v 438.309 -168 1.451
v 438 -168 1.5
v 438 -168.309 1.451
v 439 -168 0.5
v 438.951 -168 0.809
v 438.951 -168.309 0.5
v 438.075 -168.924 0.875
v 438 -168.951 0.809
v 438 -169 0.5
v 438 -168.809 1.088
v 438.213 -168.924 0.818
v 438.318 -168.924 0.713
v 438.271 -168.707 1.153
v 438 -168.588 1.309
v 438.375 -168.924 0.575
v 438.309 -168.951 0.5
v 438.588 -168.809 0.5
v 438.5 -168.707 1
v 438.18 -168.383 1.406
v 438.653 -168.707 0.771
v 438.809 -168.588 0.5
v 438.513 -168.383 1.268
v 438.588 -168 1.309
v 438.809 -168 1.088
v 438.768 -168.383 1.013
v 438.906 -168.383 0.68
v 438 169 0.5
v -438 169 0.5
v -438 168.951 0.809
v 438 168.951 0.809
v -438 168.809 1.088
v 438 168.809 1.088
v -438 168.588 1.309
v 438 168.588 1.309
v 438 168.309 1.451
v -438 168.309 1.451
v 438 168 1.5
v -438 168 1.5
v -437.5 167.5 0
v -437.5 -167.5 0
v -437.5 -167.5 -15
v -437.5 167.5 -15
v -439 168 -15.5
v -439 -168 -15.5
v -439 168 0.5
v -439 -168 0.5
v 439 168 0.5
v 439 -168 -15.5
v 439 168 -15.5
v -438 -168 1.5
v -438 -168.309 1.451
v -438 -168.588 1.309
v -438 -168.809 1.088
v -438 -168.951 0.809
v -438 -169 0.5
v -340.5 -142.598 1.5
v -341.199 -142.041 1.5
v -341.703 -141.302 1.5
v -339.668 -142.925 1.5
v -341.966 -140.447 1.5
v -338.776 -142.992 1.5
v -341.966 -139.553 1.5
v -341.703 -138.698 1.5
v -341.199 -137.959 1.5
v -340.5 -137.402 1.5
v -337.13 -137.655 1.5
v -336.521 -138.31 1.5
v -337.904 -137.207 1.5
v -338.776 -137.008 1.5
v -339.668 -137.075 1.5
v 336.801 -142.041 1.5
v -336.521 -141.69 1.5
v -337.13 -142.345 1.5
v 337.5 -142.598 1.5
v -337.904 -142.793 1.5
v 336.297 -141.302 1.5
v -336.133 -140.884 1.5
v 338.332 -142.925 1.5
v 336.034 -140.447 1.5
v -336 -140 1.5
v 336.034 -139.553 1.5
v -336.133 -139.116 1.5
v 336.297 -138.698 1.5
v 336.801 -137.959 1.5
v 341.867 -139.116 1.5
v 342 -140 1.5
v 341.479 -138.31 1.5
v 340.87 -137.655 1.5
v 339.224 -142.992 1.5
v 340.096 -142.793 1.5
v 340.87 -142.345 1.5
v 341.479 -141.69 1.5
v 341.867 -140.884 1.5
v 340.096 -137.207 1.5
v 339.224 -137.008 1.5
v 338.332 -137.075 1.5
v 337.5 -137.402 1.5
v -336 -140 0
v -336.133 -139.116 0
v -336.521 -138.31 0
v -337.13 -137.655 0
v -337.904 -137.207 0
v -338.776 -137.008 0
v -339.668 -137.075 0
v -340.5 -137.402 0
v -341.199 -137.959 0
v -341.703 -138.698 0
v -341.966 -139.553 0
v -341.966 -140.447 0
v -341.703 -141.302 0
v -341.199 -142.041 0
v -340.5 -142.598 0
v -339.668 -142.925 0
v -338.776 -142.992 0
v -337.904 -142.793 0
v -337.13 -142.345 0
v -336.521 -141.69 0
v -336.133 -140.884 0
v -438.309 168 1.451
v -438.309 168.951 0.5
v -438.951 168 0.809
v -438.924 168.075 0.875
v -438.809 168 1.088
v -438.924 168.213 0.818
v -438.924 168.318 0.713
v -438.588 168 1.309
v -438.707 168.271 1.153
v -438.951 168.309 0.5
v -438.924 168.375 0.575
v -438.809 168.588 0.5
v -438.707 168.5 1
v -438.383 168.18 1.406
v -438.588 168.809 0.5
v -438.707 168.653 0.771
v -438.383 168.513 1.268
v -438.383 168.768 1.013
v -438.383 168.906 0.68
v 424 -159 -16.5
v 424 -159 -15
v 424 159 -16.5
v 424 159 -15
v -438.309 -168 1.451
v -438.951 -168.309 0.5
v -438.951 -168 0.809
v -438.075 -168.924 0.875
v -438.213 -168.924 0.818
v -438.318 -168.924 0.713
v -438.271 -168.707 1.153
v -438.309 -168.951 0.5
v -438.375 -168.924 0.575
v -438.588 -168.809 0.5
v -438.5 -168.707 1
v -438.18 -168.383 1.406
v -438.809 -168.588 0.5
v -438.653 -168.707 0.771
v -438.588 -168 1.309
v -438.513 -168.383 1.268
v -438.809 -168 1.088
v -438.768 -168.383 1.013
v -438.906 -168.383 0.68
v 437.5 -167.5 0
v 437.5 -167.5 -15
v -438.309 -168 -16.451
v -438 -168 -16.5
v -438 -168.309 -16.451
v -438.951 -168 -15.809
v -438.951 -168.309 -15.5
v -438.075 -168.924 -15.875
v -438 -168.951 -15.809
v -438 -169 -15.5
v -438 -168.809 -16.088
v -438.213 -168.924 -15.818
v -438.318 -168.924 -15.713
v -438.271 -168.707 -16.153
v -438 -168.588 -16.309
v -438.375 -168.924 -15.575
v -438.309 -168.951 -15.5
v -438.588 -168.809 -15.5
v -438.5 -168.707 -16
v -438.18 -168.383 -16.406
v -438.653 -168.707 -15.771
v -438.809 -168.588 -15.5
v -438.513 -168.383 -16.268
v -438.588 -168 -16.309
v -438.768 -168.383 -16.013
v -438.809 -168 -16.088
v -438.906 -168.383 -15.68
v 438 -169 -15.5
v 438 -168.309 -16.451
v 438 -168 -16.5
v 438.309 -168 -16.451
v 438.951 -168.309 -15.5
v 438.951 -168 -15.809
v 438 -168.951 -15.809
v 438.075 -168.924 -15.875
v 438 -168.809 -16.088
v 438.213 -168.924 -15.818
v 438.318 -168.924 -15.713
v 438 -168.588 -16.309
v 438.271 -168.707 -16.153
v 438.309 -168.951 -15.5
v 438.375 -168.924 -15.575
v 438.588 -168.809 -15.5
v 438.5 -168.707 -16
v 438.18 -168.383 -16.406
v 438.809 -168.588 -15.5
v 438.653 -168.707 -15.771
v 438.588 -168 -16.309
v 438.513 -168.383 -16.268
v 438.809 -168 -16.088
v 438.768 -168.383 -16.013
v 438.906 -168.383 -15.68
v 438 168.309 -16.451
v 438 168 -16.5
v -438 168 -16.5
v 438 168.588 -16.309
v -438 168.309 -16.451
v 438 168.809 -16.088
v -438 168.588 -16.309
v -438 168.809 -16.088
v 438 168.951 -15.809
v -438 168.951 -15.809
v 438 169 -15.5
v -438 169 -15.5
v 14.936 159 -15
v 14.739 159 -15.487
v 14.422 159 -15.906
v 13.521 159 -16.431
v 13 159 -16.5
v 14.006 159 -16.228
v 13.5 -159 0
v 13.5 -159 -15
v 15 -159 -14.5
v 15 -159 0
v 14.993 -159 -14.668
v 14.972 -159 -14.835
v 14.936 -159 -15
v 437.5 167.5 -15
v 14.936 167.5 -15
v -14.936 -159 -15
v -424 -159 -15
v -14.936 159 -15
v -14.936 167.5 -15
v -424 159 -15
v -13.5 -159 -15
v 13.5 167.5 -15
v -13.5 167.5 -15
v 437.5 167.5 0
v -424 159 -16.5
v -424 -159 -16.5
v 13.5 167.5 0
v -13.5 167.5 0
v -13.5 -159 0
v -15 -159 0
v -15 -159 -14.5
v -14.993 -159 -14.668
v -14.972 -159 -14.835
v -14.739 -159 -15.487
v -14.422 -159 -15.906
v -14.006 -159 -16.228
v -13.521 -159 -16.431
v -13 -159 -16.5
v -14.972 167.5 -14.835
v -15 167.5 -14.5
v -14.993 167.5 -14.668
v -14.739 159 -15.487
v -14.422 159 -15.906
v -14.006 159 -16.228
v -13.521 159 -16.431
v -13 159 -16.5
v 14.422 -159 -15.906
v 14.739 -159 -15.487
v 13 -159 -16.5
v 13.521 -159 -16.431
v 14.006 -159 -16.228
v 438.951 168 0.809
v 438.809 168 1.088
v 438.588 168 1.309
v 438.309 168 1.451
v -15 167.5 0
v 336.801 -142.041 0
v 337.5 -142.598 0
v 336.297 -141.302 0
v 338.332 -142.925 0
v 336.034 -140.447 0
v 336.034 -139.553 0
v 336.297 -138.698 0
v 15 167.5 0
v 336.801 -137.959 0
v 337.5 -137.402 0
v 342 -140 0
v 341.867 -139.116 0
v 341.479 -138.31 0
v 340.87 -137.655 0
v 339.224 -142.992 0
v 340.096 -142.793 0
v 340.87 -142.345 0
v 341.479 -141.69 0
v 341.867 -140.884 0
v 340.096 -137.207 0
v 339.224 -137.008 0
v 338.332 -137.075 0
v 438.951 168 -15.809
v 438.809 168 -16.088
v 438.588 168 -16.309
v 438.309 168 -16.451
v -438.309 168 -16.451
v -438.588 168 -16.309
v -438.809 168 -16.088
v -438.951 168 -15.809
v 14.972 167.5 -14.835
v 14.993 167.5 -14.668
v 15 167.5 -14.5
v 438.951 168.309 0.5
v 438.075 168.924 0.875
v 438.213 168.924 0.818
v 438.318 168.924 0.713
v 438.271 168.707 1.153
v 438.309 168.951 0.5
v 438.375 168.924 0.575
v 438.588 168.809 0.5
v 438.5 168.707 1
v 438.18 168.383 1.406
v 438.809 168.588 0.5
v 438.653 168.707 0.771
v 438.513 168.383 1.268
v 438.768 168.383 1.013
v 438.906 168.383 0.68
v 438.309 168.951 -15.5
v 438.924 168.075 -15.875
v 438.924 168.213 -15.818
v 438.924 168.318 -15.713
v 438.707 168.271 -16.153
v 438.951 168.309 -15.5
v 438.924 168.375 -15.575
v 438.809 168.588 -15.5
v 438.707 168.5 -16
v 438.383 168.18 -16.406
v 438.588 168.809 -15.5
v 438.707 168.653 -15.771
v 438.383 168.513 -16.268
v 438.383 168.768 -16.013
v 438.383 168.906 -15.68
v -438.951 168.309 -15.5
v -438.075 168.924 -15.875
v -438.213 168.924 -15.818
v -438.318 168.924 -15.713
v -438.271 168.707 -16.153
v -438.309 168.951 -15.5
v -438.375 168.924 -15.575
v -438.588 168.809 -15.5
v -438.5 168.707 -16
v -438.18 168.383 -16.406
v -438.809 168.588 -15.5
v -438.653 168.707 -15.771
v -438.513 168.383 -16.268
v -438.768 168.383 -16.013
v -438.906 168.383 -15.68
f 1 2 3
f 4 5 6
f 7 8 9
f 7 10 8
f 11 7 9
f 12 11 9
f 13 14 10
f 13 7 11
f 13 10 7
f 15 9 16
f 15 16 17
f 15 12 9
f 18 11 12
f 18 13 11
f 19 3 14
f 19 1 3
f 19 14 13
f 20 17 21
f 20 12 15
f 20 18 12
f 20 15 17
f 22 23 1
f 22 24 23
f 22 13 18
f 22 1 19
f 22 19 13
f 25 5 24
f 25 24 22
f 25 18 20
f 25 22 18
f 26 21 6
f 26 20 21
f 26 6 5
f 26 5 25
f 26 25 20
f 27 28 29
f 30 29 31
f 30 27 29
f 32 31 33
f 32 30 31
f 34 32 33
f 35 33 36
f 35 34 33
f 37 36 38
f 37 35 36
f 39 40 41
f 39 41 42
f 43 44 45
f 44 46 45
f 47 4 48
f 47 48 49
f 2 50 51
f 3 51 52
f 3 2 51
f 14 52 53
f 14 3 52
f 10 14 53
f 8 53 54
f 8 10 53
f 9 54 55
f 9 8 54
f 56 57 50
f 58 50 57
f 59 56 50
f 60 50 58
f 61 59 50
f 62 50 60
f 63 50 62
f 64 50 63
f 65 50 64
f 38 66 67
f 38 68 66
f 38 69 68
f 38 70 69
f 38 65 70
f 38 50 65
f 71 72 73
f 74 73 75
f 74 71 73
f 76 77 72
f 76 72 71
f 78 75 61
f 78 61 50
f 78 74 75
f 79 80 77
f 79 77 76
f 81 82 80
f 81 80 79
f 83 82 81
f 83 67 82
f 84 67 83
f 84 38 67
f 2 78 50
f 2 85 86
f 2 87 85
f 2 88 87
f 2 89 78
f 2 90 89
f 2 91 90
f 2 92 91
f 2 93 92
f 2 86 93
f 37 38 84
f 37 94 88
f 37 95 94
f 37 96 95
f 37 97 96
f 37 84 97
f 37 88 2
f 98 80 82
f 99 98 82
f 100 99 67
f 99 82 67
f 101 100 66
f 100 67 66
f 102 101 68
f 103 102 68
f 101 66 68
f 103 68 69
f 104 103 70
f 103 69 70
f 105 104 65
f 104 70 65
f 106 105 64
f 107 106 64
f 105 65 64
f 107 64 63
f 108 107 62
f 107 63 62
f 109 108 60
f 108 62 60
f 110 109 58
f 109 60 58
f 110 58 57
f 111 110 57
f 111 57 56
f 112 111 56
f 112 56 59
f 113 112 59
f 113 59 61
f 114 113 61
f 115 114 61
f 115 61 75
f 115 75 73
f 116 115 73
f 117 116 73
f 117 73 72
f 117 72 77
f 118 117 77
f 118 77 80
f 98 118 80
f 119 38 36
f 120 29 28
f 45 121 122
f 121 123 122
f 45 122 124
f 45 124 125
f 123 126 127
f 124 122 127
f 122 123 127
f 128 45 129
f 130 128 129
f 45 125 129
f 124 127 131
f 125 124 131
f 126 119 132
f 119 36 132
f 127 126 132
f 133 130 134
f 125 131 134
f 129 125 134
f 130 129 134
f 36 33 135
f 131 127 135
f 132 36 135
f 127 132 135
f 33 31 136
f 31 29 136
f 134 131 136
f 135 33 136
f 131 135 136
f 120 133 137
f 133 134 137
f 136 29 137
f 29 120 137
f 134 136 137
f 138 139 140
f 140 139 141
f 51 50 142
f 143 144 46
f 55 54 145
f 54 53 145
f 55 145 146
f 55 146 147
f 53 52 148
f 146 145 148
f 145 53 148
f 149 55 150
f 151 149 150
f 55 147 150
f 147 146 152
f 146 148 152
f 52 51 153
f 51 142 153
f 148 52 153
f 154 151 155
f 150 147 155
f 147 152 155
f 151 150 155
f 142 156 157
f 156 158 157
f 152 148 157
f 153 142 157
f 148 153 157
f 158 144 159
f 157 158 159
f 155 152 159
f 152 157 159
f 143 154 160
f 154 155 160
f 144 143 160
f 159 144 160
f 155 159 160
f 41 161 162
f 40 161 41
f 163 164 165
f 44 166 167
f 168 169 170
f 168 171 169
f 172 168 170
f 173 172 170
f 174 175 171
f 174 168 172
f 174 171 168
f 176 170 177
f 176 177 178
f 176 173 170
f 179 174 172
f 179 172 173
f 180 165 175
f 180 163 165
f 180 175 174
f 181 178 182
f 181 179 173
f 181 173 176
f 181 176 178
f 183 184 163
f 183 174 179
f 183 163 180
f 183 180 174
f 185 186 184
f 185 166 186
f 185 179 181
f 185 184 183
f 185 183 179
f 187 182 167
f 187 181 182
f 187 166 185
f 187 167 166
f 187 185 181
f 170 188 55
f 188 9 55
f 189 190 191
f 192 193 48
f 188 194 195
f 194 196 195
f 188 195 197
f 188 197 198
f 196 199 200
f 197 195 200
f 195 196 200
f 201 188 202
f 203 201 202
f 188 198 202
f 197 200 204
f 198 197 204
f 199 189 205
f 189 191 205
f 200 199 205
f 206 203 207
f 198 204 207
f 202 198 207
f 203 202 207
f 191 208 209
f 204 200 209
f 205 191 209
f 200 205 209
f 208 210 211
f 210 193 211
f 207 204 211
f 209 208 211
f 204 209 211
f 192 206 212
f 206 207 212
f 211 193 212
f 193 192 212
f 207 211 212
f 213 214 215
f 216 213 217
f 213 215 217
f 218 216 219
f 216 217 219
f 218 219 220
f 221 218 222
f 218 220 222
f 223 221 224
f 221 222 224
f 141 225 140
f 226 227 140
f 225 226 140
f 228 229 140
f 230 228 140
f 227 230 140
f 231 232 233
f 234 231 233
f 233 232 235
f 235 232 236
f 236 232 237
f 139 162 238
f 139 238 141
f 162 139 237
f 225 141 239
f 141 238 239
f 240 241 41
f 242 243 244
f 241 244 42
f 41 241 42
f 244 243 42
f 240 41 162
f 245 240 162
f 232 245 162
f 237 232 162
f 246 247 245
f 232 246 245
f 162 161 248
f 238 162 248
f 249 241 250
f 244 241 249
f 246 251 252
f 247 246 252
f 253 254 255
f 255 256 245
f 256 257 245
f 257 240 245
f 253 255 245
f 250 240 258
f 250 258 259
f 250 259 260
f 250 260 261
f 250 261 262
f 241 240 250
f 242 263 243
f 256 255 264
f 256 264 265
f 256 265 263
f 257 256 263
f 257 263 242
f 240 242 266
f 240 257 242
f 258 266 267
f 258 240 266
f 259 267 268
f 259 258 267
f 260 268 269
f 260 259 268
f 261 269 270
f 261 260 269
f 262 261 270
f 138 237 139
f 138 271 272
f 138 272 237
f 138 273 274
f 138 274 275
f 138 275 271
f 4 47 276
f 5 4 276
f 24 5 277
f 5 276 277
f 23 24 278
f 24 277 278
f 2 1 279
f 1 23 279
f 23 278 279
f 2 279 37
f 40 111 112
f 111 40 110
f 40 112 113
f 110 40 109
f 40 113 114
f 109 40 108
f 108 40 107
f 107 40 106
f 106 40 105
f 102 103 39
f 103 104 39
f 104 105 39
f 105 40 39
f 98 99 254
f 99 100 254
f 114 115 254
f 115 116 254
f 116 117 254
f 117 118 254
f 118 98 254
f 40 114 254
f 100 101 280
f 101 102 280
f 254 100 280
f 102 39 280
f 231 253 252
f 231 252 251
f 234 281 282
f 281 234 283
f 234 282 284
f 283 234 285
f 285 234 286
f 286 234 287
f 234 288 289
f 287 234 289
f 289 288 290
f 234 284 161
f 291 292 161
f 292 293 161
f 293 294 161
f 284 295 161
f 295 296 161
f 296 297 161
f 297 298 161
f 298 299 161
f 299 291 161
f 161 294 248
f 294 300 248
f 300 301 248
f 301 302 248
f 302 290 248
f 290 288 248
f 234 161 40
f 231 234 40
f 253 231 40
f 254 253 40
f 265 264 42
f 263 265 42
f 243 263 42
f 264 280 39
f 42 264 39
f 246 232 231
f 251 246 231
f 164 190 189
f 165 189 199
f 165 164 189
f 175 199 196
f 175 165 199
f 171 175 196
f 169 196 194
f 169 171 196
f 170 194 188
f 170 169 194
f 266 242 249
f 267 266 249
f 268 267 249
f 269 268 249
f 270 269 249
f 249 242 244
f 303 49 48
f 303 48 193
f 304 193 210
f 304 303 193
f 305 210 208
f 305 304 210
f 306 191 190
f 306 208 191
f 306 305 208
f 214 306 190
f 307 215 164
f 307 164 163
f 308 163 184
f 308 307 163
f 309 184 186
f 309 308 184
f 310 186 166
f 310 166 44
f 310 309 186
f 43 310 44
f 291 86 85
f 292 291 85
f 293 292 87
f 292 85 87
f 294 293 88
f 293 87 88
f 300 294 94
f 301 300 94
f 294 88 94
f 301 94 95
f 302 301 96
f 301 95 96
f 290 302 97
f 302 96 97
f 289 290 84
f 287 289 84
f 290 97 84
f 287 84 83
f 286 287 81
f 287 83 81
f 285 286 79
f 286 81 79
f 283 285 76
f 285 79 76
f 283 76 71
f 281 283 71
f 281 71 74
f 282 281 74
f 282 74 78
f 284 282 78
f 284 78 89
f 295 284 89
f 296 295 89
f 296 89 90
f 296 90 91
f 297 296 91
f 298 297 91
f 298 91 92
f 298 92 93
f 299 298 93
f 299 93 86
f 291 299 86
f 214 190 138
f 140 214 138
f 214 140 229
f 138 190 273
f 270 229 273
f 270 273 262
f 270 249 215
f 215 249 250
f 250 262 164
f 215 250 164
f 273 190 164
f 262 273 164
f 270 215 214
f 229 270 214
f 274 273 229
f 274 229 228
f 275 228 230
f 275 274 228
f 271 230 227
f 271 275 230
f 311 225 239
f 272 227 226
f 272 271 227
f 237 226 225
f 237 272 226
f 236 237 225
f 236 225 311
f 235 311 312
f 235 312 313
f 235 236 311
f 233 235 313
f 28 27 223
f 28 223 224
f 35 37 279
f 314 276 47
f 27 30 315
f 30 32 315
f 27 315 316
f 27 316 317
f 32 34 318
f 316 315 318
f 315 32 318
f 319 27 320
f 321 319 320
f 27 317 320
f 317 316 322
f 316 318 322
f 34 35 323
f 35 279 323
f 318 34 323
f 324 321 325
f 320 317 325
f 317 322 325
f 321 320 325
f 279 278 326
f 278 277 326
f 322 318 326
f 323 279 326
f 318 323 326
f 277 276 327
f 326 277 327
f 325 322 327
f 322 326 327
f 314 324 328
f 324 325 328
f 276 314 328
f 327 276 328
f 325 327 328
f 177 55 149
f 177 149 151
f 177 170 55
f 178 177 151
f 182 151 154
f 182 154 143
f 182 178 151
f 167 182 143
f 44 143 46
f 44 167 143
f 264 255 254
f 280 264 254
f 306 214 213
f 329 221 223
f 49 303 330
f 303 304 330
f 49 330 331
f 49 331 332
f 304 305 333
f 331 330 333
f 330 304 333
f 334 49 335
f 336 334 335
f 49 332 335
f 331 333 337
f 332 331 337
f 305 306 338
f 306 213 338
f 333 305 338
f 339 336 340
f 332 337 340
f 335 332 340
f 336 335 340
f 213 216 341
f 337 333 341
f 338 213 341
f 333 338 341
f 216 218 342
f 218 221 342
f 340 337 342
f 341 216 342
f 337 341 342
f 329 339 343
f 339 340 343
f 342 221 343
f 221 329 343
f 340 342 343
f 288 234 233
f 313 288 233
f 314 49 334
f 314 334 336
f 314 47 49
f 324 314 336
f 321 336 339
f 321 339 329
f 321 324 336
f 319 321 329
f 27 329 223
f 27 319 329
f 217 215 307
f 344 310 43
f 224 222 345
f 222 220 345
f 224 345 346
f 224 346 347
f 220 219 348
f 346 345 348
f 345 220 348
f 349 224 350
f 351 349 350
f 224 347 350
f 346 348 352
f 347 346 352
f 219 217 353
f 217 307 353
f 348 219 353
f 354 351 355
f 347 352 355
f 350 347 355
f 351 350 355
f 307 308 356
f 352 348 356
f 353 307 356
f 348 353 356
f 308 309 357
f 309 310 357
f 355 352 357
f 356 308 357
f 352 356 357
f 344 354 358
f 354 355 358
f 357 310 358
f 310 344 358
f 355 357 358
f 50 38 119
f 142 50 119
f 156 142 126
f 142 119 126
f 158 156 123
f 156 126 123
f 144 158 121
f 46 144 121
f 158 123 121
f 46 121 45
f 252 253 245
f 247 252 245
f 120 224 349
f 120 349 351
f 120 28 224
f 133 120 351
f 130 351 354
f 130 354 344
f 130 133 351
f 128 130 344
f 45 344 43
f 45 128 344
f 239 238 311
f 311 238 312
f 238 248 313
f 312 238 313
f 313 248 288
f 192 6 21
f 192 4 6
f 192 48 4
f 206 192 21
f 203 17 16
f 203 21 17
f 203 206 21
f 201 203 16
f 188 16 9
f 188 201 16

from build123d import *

# Parameters (mm, degrees)
SKETCH_1_W          = 878
SKETCH_1_H          = 338
EXTRUDE_1_DEPTH     = 1.5
SKETCH_2_W          = 878
SKETCH_2_H          = 338
SKETCH_2_W_2        = 875
SKETCH_2_H_2        = 335
EXTRUDE_2_DEPTH     = 15
SKETCH_3_W          = 878
SKETCH_3_H          = 338
SKETCH_3_W_2        = 848
SKETCH_3_H_2        = 318
EXTRUDE_3_DEPTH     = 1.5
SKETCH_6_R          = 3
CUT_EXTRUDE_1_DEPTH = 471.750464684
FILLET_1_R          = 1
EXTRUDE_5_REACH     = 550.249
FILLET_START        = -159
FILLET_2_DEPTH      = 318
FILLET_START_2      = 133.01507
FILLET_2_2_DEPTH    = 34.48493


with BuildPart() as part:
    # 草图1 → 凸台-拉伸1 (new body)
    with BuildSketch(Plane.XY):
        Rectangle(SKETCH_1_W, SKETCH_1_H)
    extrude(amount=EXTRUDE_1_DEPTH)

    # 草图2 → 凸台-拉伸2 (add)
    with BuildSketch(Plane(origin=(0, 0, 0), x_dir=(-1, 0, 0), z_dir=(0, 0, -1))):
        Rectangle(SKETCH_2_W, SKETCH_2_H)
        Rectangle(SKETCH_2_W_2, SKETCH_2_H_2, mode=Mode.SUBTRACT)
    extrude(amount=EXTRUDE_2_DEPTH)

    # 草图3 → 凸台-拉伸3 (add)
    with BuildSketch(Plane(origin=(0, 0, -15), x_dir=(-1, 0, 0), z_dir=(0, 0, -1))):
        Rectangle(SKETCH_3_W, SKETCH_3_H)
        Rectangle(SKETCH_3_W_2, SKETCH_3_H_2, mode=Mode.SUBTRACT)
    extrude(amount=EXTRUDE_3_DEPTH)

    # 草图6 → 切除-拉伸1 (cut, through all)
    with BuildSketch(Plane.XY.offset(1.5)):
        with Locations((-339, -140)):
            Circle(SKETCH_6_R)
        with Locations((339, -140)):
            Circle(SKETCH_6_R)
    extrude(amount=-CUT_EXTRUDE_1_DEPTH, mode=Mode.SUBTRACT)

    # 圆角1
    fillet_1_edges = [part.edges().sort_by_distance(p)[0] for p in [
        (439, 0, 1.5),
        (0, 169, 1.5),
        (-439, 0, -16.5),
        (0, 169, -16.5),
        (439, 0, -16.5),
        (0, -169, -16.5),
        (-439, 0, 1.5),
        (0, -169, 1.5),
        (-439, 169, -7.5),
        (439, 169, -7.5),
        (439, -169, -7.5),
        (-439, -169, -7.5),
    ]]
    fillet(fillet_1_edges, radius=FILLET_1_R)

    # 草图9 → 凸台-拉伸5 (add, up to next)
    with BuildSketch(Plane(origin=(0, -159, 0), x_dir=(1, 0, 0), z_dir=(0, 1, 0)), mode=Mode.PRIVATE) as extrude_5_sk1:
        Polygon((15, 0), (15, 16.5), (-15, 16.5), (-15, 0), (-13.5, 0), (-13.5, 15), (13.5, 15), (13.5, 0), align=None)
    extrude_5_tool1 = extrude(extrude_5_sk1.sketch, amount=EXTRUDE_5_REACH, mode=Mode.PRIVATE) - part.part
    add(extrude_5_tool1.solids().sort_by_distance((14.657619, -159, -8.25))[0])

    # 圆角2: read off the stored shape, not the designer's step
    # 圆角2 outline → 圆角2 (cut)
    with BuildSketch(Plane(origin=(0, 0, 0), x_dir=(1, 0, 0), z_dir=(0, 1, 0)).offset(FILLET_START)):
        with BuildLine():
            ThreePointArc((-15, 14.5), (-14.414213562, 15.914213562), (-13, 16.5))
            Line((-13, 16.5), (-15, 16.5))
            Line((-15, 16.5), (-15, 14.5))
        make_face()
        with BuildLine():
            Line((15, 14.5), (15, 16.5))
            Line((15, 16.5), (13, 16.5))
            ThreePointArc((13, 16.5), (14.414213562, 15.914213562), (15, 14.5))
        make_face()
    extrude(amount=FILLET_2_DEPTH, mode=Mode.SUBTRACT)

    # Fillet 2 2 outline → Fillet 2 2 (cut)
    with BuildSketch(Plane(origin=(0, 0, 0), x_dir=(1, 0, 0), z_dir=(0, 1, 0)).offset(FILLET_START_2)):
        with BuildLine():
            Line((-15, 15), (-15, 14.5))
            ThreePointArc((-15, 14.5), (-14.984059392, 14.752008585), (-14.936491673, 15))
            Line((-14.936491673, 15), (-15, 15))
        make_face()
        with BuildLine():
            Line((15, 15), (14.936491673, 15))
            ThreePointArc((14.936491673, 15), (14.984059392, 14.752008585), (15, 14.5))
            Line((15, 14.5), (15, 15))
        make_face()
    extrude(amount=FILLET_2_2_DEPTH, mode=Mode.SUBTRACT)


solid = part.part
